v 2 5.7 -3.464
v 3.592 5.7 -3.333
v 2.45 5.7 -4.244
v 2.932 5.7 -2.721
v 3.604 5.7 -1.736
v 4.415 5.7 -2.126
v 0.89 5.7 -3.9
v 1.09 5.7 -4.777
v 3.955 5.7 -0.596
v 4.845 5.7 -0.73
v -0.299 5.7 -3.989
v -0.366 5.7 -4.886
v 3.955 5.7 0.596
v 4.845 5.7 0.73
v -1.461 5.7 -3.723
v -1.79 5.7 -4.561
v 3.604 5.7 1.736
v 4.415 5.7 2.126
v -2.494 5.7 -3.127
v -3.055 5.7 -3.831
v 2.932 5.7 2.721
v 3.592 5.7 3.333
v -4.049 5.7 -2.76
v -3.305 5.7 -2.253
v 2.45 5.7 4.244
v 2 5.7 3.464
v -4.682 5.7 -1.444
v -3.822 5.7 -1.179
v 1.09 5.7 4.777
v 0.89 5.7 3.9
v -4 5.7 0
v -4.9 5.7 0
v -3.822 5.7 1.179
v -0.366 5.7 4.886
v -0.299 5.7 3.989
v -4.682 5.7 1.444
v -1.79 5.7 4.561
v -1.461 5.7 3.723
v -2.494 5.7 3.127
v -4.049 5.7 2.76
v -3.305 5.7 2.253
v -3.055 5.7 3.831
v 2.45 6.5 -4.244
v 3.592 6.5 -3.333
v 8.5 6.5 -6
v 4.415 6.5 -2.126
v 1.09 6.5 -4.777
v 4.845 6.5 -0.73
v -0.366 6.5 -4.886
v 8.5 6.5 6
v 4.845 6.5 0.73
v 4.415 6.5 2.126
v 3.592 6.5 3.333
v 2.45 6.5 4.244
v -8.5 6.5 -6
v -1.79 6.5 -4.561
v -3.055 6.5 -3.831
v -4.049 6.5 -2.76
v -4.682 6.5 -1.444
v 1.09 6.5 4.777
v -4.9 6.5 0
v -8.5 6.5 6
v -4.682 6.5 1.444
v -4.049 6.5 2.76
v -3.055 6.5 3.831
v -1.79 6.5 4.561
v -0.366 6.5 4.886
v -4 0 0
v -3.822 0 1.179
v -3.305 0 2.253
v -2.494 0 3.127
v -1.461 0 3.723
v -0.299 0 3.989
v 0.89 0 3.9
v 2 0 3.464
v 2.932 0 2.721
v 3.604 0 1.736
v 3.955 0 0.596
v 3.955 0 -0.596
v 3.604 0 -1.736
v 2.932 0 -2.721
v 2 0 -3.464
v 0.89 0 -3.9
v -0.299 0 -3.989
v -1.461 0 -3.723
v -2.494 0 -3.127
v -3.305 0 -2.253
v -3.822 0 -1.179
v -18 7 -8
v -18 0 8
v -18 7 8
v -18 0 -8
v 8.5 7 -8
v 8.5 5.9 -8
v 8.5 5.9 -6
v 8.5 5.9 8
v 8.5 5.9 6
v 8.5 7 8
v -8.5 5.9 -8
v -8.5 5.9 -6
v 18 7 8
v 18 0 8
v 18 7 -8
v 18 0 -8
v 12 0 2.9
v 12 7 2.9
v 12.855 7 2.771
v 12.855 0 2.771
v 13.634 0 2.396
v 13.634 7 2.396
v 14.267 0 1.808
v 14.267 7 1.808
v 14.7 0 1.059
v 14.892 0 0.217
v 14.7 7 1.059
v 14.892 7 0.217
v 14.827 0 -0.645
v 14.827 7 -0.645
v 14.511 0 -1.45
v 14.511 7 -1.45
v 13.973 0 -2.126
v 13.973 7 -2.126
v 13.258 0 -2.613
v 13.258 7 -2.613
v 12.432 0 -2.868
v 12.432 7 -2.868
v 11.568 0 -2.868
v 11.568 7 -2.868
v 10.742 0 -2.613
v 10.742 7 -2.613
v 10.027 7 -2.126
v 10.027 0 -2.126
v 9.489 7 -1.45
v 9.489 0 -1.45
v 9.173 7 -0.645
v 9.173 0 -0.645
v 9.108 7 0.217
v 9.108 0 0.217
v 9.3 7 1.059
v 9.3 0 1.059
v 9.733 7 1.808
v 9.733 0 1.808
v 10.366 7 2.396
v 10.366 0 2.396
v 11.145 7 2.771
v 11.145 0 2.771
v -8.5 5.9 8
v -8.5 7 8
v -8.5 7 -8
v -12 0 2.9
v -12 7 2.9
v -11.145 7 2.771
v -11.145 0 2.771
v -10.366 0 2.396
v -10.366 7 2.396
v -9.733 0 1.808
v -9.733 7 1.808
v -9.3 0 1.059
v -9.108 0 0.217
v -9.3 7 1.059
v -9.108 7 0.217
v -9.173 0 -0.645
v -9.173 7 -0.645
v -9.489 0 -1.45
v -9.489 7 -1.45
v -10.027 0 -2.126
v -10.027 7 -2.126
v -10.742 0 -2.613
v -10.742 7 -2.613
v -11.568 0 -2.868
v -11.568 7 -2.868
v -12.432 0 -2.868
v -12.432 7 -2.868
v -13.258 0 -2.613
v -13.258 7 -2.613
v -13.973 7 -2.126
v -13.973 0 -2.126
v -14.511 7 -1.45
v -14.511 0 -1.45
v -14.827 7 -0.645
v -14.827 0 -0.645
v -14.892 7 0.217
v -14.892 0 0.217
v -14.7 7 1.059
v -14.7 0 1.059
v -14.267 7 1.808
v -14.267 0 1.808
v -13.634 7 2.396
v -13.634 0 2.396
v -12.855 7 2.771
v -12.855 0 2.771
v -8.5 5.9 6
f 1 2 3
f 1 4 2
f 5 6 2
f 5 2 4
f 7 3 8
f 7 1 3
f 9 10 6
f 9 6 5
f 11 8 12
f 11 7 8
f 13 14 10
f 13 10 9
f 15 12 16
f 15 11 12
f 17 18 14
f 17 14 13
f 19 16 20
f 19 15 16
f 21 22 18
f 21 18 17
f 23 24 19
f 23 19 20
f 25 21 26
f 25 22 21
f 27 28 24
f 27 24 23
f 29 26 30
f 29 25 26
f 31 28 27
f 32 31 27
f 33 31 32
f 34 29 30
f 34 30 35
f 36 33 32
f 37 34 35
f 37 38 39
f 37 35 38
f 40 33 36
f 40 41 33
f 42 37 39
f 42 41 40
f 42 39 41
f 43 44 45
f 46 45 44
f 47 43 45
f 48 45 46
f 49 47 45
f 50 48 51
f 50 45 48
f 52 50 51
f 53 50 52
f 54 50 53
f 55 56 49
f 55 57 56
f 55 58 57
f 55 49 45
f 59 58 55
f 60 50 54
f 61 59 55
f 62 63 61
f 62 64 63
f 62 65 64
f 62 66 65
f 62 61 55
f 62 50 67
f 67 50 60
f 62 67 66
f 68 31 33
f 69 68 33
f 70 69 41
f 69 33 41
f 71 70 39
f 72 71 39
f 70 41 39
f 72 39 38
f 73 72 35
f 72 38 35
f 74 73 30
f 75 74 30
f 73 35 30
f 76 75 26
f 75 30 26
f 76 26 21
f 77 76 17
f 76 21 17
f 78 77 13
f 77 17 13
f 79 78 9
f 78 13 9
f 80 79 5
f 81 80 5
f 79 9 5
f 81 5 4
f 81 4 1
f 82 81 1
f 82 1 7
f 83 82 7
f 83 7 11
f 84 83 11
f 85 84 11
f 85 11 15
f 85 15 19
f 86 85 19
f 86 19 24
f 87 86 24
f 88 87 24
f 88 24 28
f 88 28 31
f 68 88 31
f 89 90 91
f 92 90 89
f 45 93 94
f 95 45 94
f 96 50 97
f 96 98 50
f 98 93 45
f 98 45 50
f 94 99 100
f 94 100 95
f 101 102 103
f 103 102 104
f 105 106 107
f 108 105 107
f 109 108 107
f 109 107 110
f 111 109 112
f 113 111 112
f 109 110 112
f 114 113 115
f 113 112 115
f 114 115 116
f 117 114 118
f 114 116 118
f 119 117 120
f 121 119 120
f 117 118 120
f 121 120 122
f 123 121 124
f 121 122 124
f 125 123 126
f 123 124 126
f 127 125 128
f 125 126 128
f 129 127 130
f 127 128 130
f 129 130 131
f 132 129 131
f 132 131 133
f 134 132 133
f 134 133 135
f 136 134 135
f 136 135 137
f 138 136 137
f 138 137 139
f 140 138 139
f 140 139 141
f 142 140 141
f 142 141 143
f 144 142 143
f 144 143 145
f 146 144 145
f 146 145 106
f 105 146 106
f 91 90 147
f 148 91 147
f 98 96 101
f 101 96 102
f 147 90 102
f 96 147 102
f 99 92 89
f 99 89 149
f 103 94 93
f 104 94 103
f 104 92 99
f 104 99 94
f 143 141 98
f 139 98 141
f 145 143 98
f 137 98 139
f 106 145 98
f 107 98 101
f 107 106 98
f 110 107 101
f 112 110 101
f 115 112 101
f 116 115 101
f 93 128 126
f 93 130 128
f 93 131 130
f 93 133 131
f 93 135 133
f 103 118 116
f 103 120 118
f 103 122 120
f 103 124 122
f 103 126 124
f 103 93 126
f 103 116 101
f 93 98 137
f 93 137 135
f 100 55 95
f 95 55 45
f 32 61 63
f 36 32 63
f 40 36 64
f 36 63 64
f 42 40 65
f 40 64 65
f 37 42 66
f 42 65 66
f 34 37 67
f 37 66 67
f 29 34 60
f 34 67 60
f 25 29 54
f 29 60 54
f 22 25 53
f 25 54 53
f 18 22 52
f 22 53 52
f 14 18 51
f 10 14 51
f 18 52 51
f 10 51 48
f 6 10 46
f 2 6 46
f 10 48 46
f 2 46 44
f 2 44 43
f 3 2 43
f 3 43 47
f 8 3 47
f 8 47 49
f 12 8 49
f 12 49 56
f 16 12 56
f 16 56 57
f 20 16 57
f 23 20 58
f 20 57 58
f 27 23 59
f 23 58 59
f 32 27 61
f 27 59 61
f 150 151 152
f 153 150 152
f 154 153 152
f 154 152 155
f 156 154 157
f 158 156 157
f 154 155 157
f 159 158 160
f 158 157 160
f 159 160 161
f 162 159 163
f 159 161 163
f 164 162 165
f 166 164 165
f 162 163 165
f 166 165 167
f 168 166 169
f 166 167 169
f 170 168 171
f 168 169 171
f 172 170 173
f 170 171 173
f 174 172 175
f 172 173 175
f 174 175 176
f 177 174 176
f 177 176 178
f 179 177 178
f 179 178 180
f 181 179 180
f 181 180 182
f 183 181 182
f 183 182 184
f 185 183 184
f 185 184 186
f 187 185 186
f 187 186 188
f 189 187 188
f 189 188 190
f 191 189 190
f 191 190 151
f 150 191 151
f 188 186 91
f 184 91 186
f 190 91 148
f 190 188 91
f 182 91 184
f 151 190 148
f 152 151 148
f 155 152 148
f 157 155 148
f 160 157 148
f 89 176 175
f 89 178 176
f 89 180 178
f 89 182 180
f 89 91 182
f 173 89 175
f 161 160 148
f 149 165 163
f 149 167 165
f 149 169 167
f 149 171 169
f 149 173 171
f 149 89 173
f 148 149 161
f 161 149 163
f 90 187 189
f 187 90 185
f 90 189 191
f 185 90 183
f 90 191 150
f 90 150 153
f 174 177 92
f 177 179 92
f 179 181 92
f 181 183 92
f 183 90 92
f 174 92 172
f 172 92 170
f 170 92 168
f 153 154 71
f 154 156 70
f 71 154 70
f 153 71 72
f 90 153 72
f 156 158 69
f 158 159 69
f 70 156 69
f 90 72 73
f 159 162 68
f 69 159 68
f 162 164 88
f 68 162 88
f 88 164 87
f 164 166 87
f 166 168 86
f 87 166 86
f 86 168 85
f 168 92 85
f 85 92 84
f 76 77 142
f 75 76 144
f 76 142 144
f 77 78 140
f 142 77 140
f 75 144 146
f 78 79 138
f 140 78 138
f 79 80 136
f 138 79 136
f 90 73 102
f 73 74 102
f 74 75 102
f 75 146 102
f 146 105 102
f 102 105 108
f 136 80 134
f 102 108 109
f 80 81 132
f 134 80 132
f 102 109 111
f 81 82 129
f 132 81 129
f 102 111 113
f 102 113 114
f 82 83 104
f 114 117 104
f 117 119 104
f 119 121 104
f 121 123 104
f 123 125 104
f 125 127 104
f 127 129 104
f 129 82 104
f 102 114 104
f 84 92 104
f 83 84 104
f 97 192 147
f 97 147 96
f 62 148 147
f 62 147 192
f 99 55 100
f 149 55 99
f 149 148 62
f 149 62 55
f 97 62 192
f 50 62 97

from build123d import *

# Parameters (mm, degrees)
SKETCH_1_W               = 36
SKETCH_1_H               = 16
EXTRUDE_1_DEPTH          = 7
CUT_EXTRUDE_1_DEPTH      = 26.079872408
CUT_EXTRUDE_1_DEPTH_BACK = 26.079872408
SKETCH_5_R               = 4.9
CUT_EXTRUDE_2_DEPTH      = 0.8
SKETCH_6_R               = 4
CUT_EXTRUDE_3_DEPTH      = 21.505852823
SKETCH_7_W               = 17
SKETCH_7_H               = 2
CUT_EXTRUDE_4_DEPTH      = 0.6
SKETCH_8_W               = 17
SKETCH_8_H               = 2
CUT_EXTRUDE_5_DEPTH      = 0.6
SKETCH_9_R               = 2.9
CUT_EXTRUDE_6_DEPTH      = 21.90454496


with BuildPart() as part:
    # 草图1 → 凸台-拉伸1 (new body)
    with BuildSketch(Plane(origin=(0, 0, 0), x_dir=(1, 0, 0), z_dir=(0, 1, 0))):
        Rectangle(SKETCH_1_W, SKETCH_1_H)
    extrude(amount=EXTRUDE_1_DEPTH)

    # 草图4 → 切除-拉伸1 (cut, two sides: drawn at the far end of the back side and taken through both)
    with BuildSketch(Plane(origin=(0, 0, -8), x_dir=(-1, 0, 0), z_dir=(0, 0, -1)).offset(-CUT_EXTRUDE_1_DEPTH_BACK)):
        Polygon((-8.5, 71.817880295), (-8.5, 7), (-8.5, 6.5), (8.5, 6.5), (8.5, 7), (8.5, 71.817880295), (8.5, 201.453640884), (-8.5, 201.453640884), align=None)
    extrude(amount=CUT_EXTRUDE_1_DEPTH + CUT_EXTRUDE_1_DEPTH_BACK, mode=Mode.SUBTRACT)

    # 草图5 → 切除-拉伸2 (cut)
    with BuildSketch(Plane(origin=(0, 6.5, 0), x_dir=(1, 0, 0), z_dir=(0, 1, 0))):
        with Locations(Location((0, 0, 0), (0, 0, 180))):
            Circle(SKETCH_5_R)
    extrude(amount=-CUT_EXTRUDE_2_DEPTH, mode=Mode.SUBTRACT)

    # 草图6 → 切除-拉伸3 (cut, through all)
    with BuildSketch(Plane(origin=(0, 5.7, 0), x_dir=(1, 0, 0), z_dir=(0, 1, 0))):
        with Locations(Location((0, 0, 0), (0, 0, 180))):
            Circle(SKETCH_6_R)
    extrude(amount=-CUT_EXTRUDE_3_DEPTH, mode=Mode.SUBTRACT)

    # 草图7 → 切除-拉伸4 (cut)
    with BuildSketch(Plane(origin=(0, 6.5, 0), x_dir=(1, 0, 0), z_dir=(0, 1, 0))):
        with Locations((0, 7)):
            Rectangle(SKETCH_7_W, SKETCH_7_H)
    extrude(amount=-CUT_EXTRUDE_4_DEPTH, mode=Mode.SUBTRACT)

    # 草图8 → 切除-拉伸5 (cut)
    with BuildSketch(Plane(origin=(0, 6.5, 0), x_dir=(1, 0, 0), z_dir=(0, 1, 0))):
        with Locations((0, -7)):
            Rectangle(SKETCH_8_W, SKETCH_8_H)
    extrude(amount=-CUT_EXTRUDE_5_DEPTH, mode=Mode.SUBTRACT)

    # 草图9 → 切除-拉伸6 (cut, through all)
    with BuildSketch(Plane(origin=(0, 7, 0), x_dir=(1, 0, 0), z_dir=(0, 1, 0))):
        with Locations(Location((-12, 0, 0), (0, 0, 270))):
            Circle(SKETCH_9_R)
        with Locations(Location((12, 0, 0), (0, 0, 270))):
            Circle(SKETCH_9_R)
    extrude(amount=-CUT_EXTRUDE_6_DEPTH, mode=Mode.SUBTRACT)


solid = part.part
